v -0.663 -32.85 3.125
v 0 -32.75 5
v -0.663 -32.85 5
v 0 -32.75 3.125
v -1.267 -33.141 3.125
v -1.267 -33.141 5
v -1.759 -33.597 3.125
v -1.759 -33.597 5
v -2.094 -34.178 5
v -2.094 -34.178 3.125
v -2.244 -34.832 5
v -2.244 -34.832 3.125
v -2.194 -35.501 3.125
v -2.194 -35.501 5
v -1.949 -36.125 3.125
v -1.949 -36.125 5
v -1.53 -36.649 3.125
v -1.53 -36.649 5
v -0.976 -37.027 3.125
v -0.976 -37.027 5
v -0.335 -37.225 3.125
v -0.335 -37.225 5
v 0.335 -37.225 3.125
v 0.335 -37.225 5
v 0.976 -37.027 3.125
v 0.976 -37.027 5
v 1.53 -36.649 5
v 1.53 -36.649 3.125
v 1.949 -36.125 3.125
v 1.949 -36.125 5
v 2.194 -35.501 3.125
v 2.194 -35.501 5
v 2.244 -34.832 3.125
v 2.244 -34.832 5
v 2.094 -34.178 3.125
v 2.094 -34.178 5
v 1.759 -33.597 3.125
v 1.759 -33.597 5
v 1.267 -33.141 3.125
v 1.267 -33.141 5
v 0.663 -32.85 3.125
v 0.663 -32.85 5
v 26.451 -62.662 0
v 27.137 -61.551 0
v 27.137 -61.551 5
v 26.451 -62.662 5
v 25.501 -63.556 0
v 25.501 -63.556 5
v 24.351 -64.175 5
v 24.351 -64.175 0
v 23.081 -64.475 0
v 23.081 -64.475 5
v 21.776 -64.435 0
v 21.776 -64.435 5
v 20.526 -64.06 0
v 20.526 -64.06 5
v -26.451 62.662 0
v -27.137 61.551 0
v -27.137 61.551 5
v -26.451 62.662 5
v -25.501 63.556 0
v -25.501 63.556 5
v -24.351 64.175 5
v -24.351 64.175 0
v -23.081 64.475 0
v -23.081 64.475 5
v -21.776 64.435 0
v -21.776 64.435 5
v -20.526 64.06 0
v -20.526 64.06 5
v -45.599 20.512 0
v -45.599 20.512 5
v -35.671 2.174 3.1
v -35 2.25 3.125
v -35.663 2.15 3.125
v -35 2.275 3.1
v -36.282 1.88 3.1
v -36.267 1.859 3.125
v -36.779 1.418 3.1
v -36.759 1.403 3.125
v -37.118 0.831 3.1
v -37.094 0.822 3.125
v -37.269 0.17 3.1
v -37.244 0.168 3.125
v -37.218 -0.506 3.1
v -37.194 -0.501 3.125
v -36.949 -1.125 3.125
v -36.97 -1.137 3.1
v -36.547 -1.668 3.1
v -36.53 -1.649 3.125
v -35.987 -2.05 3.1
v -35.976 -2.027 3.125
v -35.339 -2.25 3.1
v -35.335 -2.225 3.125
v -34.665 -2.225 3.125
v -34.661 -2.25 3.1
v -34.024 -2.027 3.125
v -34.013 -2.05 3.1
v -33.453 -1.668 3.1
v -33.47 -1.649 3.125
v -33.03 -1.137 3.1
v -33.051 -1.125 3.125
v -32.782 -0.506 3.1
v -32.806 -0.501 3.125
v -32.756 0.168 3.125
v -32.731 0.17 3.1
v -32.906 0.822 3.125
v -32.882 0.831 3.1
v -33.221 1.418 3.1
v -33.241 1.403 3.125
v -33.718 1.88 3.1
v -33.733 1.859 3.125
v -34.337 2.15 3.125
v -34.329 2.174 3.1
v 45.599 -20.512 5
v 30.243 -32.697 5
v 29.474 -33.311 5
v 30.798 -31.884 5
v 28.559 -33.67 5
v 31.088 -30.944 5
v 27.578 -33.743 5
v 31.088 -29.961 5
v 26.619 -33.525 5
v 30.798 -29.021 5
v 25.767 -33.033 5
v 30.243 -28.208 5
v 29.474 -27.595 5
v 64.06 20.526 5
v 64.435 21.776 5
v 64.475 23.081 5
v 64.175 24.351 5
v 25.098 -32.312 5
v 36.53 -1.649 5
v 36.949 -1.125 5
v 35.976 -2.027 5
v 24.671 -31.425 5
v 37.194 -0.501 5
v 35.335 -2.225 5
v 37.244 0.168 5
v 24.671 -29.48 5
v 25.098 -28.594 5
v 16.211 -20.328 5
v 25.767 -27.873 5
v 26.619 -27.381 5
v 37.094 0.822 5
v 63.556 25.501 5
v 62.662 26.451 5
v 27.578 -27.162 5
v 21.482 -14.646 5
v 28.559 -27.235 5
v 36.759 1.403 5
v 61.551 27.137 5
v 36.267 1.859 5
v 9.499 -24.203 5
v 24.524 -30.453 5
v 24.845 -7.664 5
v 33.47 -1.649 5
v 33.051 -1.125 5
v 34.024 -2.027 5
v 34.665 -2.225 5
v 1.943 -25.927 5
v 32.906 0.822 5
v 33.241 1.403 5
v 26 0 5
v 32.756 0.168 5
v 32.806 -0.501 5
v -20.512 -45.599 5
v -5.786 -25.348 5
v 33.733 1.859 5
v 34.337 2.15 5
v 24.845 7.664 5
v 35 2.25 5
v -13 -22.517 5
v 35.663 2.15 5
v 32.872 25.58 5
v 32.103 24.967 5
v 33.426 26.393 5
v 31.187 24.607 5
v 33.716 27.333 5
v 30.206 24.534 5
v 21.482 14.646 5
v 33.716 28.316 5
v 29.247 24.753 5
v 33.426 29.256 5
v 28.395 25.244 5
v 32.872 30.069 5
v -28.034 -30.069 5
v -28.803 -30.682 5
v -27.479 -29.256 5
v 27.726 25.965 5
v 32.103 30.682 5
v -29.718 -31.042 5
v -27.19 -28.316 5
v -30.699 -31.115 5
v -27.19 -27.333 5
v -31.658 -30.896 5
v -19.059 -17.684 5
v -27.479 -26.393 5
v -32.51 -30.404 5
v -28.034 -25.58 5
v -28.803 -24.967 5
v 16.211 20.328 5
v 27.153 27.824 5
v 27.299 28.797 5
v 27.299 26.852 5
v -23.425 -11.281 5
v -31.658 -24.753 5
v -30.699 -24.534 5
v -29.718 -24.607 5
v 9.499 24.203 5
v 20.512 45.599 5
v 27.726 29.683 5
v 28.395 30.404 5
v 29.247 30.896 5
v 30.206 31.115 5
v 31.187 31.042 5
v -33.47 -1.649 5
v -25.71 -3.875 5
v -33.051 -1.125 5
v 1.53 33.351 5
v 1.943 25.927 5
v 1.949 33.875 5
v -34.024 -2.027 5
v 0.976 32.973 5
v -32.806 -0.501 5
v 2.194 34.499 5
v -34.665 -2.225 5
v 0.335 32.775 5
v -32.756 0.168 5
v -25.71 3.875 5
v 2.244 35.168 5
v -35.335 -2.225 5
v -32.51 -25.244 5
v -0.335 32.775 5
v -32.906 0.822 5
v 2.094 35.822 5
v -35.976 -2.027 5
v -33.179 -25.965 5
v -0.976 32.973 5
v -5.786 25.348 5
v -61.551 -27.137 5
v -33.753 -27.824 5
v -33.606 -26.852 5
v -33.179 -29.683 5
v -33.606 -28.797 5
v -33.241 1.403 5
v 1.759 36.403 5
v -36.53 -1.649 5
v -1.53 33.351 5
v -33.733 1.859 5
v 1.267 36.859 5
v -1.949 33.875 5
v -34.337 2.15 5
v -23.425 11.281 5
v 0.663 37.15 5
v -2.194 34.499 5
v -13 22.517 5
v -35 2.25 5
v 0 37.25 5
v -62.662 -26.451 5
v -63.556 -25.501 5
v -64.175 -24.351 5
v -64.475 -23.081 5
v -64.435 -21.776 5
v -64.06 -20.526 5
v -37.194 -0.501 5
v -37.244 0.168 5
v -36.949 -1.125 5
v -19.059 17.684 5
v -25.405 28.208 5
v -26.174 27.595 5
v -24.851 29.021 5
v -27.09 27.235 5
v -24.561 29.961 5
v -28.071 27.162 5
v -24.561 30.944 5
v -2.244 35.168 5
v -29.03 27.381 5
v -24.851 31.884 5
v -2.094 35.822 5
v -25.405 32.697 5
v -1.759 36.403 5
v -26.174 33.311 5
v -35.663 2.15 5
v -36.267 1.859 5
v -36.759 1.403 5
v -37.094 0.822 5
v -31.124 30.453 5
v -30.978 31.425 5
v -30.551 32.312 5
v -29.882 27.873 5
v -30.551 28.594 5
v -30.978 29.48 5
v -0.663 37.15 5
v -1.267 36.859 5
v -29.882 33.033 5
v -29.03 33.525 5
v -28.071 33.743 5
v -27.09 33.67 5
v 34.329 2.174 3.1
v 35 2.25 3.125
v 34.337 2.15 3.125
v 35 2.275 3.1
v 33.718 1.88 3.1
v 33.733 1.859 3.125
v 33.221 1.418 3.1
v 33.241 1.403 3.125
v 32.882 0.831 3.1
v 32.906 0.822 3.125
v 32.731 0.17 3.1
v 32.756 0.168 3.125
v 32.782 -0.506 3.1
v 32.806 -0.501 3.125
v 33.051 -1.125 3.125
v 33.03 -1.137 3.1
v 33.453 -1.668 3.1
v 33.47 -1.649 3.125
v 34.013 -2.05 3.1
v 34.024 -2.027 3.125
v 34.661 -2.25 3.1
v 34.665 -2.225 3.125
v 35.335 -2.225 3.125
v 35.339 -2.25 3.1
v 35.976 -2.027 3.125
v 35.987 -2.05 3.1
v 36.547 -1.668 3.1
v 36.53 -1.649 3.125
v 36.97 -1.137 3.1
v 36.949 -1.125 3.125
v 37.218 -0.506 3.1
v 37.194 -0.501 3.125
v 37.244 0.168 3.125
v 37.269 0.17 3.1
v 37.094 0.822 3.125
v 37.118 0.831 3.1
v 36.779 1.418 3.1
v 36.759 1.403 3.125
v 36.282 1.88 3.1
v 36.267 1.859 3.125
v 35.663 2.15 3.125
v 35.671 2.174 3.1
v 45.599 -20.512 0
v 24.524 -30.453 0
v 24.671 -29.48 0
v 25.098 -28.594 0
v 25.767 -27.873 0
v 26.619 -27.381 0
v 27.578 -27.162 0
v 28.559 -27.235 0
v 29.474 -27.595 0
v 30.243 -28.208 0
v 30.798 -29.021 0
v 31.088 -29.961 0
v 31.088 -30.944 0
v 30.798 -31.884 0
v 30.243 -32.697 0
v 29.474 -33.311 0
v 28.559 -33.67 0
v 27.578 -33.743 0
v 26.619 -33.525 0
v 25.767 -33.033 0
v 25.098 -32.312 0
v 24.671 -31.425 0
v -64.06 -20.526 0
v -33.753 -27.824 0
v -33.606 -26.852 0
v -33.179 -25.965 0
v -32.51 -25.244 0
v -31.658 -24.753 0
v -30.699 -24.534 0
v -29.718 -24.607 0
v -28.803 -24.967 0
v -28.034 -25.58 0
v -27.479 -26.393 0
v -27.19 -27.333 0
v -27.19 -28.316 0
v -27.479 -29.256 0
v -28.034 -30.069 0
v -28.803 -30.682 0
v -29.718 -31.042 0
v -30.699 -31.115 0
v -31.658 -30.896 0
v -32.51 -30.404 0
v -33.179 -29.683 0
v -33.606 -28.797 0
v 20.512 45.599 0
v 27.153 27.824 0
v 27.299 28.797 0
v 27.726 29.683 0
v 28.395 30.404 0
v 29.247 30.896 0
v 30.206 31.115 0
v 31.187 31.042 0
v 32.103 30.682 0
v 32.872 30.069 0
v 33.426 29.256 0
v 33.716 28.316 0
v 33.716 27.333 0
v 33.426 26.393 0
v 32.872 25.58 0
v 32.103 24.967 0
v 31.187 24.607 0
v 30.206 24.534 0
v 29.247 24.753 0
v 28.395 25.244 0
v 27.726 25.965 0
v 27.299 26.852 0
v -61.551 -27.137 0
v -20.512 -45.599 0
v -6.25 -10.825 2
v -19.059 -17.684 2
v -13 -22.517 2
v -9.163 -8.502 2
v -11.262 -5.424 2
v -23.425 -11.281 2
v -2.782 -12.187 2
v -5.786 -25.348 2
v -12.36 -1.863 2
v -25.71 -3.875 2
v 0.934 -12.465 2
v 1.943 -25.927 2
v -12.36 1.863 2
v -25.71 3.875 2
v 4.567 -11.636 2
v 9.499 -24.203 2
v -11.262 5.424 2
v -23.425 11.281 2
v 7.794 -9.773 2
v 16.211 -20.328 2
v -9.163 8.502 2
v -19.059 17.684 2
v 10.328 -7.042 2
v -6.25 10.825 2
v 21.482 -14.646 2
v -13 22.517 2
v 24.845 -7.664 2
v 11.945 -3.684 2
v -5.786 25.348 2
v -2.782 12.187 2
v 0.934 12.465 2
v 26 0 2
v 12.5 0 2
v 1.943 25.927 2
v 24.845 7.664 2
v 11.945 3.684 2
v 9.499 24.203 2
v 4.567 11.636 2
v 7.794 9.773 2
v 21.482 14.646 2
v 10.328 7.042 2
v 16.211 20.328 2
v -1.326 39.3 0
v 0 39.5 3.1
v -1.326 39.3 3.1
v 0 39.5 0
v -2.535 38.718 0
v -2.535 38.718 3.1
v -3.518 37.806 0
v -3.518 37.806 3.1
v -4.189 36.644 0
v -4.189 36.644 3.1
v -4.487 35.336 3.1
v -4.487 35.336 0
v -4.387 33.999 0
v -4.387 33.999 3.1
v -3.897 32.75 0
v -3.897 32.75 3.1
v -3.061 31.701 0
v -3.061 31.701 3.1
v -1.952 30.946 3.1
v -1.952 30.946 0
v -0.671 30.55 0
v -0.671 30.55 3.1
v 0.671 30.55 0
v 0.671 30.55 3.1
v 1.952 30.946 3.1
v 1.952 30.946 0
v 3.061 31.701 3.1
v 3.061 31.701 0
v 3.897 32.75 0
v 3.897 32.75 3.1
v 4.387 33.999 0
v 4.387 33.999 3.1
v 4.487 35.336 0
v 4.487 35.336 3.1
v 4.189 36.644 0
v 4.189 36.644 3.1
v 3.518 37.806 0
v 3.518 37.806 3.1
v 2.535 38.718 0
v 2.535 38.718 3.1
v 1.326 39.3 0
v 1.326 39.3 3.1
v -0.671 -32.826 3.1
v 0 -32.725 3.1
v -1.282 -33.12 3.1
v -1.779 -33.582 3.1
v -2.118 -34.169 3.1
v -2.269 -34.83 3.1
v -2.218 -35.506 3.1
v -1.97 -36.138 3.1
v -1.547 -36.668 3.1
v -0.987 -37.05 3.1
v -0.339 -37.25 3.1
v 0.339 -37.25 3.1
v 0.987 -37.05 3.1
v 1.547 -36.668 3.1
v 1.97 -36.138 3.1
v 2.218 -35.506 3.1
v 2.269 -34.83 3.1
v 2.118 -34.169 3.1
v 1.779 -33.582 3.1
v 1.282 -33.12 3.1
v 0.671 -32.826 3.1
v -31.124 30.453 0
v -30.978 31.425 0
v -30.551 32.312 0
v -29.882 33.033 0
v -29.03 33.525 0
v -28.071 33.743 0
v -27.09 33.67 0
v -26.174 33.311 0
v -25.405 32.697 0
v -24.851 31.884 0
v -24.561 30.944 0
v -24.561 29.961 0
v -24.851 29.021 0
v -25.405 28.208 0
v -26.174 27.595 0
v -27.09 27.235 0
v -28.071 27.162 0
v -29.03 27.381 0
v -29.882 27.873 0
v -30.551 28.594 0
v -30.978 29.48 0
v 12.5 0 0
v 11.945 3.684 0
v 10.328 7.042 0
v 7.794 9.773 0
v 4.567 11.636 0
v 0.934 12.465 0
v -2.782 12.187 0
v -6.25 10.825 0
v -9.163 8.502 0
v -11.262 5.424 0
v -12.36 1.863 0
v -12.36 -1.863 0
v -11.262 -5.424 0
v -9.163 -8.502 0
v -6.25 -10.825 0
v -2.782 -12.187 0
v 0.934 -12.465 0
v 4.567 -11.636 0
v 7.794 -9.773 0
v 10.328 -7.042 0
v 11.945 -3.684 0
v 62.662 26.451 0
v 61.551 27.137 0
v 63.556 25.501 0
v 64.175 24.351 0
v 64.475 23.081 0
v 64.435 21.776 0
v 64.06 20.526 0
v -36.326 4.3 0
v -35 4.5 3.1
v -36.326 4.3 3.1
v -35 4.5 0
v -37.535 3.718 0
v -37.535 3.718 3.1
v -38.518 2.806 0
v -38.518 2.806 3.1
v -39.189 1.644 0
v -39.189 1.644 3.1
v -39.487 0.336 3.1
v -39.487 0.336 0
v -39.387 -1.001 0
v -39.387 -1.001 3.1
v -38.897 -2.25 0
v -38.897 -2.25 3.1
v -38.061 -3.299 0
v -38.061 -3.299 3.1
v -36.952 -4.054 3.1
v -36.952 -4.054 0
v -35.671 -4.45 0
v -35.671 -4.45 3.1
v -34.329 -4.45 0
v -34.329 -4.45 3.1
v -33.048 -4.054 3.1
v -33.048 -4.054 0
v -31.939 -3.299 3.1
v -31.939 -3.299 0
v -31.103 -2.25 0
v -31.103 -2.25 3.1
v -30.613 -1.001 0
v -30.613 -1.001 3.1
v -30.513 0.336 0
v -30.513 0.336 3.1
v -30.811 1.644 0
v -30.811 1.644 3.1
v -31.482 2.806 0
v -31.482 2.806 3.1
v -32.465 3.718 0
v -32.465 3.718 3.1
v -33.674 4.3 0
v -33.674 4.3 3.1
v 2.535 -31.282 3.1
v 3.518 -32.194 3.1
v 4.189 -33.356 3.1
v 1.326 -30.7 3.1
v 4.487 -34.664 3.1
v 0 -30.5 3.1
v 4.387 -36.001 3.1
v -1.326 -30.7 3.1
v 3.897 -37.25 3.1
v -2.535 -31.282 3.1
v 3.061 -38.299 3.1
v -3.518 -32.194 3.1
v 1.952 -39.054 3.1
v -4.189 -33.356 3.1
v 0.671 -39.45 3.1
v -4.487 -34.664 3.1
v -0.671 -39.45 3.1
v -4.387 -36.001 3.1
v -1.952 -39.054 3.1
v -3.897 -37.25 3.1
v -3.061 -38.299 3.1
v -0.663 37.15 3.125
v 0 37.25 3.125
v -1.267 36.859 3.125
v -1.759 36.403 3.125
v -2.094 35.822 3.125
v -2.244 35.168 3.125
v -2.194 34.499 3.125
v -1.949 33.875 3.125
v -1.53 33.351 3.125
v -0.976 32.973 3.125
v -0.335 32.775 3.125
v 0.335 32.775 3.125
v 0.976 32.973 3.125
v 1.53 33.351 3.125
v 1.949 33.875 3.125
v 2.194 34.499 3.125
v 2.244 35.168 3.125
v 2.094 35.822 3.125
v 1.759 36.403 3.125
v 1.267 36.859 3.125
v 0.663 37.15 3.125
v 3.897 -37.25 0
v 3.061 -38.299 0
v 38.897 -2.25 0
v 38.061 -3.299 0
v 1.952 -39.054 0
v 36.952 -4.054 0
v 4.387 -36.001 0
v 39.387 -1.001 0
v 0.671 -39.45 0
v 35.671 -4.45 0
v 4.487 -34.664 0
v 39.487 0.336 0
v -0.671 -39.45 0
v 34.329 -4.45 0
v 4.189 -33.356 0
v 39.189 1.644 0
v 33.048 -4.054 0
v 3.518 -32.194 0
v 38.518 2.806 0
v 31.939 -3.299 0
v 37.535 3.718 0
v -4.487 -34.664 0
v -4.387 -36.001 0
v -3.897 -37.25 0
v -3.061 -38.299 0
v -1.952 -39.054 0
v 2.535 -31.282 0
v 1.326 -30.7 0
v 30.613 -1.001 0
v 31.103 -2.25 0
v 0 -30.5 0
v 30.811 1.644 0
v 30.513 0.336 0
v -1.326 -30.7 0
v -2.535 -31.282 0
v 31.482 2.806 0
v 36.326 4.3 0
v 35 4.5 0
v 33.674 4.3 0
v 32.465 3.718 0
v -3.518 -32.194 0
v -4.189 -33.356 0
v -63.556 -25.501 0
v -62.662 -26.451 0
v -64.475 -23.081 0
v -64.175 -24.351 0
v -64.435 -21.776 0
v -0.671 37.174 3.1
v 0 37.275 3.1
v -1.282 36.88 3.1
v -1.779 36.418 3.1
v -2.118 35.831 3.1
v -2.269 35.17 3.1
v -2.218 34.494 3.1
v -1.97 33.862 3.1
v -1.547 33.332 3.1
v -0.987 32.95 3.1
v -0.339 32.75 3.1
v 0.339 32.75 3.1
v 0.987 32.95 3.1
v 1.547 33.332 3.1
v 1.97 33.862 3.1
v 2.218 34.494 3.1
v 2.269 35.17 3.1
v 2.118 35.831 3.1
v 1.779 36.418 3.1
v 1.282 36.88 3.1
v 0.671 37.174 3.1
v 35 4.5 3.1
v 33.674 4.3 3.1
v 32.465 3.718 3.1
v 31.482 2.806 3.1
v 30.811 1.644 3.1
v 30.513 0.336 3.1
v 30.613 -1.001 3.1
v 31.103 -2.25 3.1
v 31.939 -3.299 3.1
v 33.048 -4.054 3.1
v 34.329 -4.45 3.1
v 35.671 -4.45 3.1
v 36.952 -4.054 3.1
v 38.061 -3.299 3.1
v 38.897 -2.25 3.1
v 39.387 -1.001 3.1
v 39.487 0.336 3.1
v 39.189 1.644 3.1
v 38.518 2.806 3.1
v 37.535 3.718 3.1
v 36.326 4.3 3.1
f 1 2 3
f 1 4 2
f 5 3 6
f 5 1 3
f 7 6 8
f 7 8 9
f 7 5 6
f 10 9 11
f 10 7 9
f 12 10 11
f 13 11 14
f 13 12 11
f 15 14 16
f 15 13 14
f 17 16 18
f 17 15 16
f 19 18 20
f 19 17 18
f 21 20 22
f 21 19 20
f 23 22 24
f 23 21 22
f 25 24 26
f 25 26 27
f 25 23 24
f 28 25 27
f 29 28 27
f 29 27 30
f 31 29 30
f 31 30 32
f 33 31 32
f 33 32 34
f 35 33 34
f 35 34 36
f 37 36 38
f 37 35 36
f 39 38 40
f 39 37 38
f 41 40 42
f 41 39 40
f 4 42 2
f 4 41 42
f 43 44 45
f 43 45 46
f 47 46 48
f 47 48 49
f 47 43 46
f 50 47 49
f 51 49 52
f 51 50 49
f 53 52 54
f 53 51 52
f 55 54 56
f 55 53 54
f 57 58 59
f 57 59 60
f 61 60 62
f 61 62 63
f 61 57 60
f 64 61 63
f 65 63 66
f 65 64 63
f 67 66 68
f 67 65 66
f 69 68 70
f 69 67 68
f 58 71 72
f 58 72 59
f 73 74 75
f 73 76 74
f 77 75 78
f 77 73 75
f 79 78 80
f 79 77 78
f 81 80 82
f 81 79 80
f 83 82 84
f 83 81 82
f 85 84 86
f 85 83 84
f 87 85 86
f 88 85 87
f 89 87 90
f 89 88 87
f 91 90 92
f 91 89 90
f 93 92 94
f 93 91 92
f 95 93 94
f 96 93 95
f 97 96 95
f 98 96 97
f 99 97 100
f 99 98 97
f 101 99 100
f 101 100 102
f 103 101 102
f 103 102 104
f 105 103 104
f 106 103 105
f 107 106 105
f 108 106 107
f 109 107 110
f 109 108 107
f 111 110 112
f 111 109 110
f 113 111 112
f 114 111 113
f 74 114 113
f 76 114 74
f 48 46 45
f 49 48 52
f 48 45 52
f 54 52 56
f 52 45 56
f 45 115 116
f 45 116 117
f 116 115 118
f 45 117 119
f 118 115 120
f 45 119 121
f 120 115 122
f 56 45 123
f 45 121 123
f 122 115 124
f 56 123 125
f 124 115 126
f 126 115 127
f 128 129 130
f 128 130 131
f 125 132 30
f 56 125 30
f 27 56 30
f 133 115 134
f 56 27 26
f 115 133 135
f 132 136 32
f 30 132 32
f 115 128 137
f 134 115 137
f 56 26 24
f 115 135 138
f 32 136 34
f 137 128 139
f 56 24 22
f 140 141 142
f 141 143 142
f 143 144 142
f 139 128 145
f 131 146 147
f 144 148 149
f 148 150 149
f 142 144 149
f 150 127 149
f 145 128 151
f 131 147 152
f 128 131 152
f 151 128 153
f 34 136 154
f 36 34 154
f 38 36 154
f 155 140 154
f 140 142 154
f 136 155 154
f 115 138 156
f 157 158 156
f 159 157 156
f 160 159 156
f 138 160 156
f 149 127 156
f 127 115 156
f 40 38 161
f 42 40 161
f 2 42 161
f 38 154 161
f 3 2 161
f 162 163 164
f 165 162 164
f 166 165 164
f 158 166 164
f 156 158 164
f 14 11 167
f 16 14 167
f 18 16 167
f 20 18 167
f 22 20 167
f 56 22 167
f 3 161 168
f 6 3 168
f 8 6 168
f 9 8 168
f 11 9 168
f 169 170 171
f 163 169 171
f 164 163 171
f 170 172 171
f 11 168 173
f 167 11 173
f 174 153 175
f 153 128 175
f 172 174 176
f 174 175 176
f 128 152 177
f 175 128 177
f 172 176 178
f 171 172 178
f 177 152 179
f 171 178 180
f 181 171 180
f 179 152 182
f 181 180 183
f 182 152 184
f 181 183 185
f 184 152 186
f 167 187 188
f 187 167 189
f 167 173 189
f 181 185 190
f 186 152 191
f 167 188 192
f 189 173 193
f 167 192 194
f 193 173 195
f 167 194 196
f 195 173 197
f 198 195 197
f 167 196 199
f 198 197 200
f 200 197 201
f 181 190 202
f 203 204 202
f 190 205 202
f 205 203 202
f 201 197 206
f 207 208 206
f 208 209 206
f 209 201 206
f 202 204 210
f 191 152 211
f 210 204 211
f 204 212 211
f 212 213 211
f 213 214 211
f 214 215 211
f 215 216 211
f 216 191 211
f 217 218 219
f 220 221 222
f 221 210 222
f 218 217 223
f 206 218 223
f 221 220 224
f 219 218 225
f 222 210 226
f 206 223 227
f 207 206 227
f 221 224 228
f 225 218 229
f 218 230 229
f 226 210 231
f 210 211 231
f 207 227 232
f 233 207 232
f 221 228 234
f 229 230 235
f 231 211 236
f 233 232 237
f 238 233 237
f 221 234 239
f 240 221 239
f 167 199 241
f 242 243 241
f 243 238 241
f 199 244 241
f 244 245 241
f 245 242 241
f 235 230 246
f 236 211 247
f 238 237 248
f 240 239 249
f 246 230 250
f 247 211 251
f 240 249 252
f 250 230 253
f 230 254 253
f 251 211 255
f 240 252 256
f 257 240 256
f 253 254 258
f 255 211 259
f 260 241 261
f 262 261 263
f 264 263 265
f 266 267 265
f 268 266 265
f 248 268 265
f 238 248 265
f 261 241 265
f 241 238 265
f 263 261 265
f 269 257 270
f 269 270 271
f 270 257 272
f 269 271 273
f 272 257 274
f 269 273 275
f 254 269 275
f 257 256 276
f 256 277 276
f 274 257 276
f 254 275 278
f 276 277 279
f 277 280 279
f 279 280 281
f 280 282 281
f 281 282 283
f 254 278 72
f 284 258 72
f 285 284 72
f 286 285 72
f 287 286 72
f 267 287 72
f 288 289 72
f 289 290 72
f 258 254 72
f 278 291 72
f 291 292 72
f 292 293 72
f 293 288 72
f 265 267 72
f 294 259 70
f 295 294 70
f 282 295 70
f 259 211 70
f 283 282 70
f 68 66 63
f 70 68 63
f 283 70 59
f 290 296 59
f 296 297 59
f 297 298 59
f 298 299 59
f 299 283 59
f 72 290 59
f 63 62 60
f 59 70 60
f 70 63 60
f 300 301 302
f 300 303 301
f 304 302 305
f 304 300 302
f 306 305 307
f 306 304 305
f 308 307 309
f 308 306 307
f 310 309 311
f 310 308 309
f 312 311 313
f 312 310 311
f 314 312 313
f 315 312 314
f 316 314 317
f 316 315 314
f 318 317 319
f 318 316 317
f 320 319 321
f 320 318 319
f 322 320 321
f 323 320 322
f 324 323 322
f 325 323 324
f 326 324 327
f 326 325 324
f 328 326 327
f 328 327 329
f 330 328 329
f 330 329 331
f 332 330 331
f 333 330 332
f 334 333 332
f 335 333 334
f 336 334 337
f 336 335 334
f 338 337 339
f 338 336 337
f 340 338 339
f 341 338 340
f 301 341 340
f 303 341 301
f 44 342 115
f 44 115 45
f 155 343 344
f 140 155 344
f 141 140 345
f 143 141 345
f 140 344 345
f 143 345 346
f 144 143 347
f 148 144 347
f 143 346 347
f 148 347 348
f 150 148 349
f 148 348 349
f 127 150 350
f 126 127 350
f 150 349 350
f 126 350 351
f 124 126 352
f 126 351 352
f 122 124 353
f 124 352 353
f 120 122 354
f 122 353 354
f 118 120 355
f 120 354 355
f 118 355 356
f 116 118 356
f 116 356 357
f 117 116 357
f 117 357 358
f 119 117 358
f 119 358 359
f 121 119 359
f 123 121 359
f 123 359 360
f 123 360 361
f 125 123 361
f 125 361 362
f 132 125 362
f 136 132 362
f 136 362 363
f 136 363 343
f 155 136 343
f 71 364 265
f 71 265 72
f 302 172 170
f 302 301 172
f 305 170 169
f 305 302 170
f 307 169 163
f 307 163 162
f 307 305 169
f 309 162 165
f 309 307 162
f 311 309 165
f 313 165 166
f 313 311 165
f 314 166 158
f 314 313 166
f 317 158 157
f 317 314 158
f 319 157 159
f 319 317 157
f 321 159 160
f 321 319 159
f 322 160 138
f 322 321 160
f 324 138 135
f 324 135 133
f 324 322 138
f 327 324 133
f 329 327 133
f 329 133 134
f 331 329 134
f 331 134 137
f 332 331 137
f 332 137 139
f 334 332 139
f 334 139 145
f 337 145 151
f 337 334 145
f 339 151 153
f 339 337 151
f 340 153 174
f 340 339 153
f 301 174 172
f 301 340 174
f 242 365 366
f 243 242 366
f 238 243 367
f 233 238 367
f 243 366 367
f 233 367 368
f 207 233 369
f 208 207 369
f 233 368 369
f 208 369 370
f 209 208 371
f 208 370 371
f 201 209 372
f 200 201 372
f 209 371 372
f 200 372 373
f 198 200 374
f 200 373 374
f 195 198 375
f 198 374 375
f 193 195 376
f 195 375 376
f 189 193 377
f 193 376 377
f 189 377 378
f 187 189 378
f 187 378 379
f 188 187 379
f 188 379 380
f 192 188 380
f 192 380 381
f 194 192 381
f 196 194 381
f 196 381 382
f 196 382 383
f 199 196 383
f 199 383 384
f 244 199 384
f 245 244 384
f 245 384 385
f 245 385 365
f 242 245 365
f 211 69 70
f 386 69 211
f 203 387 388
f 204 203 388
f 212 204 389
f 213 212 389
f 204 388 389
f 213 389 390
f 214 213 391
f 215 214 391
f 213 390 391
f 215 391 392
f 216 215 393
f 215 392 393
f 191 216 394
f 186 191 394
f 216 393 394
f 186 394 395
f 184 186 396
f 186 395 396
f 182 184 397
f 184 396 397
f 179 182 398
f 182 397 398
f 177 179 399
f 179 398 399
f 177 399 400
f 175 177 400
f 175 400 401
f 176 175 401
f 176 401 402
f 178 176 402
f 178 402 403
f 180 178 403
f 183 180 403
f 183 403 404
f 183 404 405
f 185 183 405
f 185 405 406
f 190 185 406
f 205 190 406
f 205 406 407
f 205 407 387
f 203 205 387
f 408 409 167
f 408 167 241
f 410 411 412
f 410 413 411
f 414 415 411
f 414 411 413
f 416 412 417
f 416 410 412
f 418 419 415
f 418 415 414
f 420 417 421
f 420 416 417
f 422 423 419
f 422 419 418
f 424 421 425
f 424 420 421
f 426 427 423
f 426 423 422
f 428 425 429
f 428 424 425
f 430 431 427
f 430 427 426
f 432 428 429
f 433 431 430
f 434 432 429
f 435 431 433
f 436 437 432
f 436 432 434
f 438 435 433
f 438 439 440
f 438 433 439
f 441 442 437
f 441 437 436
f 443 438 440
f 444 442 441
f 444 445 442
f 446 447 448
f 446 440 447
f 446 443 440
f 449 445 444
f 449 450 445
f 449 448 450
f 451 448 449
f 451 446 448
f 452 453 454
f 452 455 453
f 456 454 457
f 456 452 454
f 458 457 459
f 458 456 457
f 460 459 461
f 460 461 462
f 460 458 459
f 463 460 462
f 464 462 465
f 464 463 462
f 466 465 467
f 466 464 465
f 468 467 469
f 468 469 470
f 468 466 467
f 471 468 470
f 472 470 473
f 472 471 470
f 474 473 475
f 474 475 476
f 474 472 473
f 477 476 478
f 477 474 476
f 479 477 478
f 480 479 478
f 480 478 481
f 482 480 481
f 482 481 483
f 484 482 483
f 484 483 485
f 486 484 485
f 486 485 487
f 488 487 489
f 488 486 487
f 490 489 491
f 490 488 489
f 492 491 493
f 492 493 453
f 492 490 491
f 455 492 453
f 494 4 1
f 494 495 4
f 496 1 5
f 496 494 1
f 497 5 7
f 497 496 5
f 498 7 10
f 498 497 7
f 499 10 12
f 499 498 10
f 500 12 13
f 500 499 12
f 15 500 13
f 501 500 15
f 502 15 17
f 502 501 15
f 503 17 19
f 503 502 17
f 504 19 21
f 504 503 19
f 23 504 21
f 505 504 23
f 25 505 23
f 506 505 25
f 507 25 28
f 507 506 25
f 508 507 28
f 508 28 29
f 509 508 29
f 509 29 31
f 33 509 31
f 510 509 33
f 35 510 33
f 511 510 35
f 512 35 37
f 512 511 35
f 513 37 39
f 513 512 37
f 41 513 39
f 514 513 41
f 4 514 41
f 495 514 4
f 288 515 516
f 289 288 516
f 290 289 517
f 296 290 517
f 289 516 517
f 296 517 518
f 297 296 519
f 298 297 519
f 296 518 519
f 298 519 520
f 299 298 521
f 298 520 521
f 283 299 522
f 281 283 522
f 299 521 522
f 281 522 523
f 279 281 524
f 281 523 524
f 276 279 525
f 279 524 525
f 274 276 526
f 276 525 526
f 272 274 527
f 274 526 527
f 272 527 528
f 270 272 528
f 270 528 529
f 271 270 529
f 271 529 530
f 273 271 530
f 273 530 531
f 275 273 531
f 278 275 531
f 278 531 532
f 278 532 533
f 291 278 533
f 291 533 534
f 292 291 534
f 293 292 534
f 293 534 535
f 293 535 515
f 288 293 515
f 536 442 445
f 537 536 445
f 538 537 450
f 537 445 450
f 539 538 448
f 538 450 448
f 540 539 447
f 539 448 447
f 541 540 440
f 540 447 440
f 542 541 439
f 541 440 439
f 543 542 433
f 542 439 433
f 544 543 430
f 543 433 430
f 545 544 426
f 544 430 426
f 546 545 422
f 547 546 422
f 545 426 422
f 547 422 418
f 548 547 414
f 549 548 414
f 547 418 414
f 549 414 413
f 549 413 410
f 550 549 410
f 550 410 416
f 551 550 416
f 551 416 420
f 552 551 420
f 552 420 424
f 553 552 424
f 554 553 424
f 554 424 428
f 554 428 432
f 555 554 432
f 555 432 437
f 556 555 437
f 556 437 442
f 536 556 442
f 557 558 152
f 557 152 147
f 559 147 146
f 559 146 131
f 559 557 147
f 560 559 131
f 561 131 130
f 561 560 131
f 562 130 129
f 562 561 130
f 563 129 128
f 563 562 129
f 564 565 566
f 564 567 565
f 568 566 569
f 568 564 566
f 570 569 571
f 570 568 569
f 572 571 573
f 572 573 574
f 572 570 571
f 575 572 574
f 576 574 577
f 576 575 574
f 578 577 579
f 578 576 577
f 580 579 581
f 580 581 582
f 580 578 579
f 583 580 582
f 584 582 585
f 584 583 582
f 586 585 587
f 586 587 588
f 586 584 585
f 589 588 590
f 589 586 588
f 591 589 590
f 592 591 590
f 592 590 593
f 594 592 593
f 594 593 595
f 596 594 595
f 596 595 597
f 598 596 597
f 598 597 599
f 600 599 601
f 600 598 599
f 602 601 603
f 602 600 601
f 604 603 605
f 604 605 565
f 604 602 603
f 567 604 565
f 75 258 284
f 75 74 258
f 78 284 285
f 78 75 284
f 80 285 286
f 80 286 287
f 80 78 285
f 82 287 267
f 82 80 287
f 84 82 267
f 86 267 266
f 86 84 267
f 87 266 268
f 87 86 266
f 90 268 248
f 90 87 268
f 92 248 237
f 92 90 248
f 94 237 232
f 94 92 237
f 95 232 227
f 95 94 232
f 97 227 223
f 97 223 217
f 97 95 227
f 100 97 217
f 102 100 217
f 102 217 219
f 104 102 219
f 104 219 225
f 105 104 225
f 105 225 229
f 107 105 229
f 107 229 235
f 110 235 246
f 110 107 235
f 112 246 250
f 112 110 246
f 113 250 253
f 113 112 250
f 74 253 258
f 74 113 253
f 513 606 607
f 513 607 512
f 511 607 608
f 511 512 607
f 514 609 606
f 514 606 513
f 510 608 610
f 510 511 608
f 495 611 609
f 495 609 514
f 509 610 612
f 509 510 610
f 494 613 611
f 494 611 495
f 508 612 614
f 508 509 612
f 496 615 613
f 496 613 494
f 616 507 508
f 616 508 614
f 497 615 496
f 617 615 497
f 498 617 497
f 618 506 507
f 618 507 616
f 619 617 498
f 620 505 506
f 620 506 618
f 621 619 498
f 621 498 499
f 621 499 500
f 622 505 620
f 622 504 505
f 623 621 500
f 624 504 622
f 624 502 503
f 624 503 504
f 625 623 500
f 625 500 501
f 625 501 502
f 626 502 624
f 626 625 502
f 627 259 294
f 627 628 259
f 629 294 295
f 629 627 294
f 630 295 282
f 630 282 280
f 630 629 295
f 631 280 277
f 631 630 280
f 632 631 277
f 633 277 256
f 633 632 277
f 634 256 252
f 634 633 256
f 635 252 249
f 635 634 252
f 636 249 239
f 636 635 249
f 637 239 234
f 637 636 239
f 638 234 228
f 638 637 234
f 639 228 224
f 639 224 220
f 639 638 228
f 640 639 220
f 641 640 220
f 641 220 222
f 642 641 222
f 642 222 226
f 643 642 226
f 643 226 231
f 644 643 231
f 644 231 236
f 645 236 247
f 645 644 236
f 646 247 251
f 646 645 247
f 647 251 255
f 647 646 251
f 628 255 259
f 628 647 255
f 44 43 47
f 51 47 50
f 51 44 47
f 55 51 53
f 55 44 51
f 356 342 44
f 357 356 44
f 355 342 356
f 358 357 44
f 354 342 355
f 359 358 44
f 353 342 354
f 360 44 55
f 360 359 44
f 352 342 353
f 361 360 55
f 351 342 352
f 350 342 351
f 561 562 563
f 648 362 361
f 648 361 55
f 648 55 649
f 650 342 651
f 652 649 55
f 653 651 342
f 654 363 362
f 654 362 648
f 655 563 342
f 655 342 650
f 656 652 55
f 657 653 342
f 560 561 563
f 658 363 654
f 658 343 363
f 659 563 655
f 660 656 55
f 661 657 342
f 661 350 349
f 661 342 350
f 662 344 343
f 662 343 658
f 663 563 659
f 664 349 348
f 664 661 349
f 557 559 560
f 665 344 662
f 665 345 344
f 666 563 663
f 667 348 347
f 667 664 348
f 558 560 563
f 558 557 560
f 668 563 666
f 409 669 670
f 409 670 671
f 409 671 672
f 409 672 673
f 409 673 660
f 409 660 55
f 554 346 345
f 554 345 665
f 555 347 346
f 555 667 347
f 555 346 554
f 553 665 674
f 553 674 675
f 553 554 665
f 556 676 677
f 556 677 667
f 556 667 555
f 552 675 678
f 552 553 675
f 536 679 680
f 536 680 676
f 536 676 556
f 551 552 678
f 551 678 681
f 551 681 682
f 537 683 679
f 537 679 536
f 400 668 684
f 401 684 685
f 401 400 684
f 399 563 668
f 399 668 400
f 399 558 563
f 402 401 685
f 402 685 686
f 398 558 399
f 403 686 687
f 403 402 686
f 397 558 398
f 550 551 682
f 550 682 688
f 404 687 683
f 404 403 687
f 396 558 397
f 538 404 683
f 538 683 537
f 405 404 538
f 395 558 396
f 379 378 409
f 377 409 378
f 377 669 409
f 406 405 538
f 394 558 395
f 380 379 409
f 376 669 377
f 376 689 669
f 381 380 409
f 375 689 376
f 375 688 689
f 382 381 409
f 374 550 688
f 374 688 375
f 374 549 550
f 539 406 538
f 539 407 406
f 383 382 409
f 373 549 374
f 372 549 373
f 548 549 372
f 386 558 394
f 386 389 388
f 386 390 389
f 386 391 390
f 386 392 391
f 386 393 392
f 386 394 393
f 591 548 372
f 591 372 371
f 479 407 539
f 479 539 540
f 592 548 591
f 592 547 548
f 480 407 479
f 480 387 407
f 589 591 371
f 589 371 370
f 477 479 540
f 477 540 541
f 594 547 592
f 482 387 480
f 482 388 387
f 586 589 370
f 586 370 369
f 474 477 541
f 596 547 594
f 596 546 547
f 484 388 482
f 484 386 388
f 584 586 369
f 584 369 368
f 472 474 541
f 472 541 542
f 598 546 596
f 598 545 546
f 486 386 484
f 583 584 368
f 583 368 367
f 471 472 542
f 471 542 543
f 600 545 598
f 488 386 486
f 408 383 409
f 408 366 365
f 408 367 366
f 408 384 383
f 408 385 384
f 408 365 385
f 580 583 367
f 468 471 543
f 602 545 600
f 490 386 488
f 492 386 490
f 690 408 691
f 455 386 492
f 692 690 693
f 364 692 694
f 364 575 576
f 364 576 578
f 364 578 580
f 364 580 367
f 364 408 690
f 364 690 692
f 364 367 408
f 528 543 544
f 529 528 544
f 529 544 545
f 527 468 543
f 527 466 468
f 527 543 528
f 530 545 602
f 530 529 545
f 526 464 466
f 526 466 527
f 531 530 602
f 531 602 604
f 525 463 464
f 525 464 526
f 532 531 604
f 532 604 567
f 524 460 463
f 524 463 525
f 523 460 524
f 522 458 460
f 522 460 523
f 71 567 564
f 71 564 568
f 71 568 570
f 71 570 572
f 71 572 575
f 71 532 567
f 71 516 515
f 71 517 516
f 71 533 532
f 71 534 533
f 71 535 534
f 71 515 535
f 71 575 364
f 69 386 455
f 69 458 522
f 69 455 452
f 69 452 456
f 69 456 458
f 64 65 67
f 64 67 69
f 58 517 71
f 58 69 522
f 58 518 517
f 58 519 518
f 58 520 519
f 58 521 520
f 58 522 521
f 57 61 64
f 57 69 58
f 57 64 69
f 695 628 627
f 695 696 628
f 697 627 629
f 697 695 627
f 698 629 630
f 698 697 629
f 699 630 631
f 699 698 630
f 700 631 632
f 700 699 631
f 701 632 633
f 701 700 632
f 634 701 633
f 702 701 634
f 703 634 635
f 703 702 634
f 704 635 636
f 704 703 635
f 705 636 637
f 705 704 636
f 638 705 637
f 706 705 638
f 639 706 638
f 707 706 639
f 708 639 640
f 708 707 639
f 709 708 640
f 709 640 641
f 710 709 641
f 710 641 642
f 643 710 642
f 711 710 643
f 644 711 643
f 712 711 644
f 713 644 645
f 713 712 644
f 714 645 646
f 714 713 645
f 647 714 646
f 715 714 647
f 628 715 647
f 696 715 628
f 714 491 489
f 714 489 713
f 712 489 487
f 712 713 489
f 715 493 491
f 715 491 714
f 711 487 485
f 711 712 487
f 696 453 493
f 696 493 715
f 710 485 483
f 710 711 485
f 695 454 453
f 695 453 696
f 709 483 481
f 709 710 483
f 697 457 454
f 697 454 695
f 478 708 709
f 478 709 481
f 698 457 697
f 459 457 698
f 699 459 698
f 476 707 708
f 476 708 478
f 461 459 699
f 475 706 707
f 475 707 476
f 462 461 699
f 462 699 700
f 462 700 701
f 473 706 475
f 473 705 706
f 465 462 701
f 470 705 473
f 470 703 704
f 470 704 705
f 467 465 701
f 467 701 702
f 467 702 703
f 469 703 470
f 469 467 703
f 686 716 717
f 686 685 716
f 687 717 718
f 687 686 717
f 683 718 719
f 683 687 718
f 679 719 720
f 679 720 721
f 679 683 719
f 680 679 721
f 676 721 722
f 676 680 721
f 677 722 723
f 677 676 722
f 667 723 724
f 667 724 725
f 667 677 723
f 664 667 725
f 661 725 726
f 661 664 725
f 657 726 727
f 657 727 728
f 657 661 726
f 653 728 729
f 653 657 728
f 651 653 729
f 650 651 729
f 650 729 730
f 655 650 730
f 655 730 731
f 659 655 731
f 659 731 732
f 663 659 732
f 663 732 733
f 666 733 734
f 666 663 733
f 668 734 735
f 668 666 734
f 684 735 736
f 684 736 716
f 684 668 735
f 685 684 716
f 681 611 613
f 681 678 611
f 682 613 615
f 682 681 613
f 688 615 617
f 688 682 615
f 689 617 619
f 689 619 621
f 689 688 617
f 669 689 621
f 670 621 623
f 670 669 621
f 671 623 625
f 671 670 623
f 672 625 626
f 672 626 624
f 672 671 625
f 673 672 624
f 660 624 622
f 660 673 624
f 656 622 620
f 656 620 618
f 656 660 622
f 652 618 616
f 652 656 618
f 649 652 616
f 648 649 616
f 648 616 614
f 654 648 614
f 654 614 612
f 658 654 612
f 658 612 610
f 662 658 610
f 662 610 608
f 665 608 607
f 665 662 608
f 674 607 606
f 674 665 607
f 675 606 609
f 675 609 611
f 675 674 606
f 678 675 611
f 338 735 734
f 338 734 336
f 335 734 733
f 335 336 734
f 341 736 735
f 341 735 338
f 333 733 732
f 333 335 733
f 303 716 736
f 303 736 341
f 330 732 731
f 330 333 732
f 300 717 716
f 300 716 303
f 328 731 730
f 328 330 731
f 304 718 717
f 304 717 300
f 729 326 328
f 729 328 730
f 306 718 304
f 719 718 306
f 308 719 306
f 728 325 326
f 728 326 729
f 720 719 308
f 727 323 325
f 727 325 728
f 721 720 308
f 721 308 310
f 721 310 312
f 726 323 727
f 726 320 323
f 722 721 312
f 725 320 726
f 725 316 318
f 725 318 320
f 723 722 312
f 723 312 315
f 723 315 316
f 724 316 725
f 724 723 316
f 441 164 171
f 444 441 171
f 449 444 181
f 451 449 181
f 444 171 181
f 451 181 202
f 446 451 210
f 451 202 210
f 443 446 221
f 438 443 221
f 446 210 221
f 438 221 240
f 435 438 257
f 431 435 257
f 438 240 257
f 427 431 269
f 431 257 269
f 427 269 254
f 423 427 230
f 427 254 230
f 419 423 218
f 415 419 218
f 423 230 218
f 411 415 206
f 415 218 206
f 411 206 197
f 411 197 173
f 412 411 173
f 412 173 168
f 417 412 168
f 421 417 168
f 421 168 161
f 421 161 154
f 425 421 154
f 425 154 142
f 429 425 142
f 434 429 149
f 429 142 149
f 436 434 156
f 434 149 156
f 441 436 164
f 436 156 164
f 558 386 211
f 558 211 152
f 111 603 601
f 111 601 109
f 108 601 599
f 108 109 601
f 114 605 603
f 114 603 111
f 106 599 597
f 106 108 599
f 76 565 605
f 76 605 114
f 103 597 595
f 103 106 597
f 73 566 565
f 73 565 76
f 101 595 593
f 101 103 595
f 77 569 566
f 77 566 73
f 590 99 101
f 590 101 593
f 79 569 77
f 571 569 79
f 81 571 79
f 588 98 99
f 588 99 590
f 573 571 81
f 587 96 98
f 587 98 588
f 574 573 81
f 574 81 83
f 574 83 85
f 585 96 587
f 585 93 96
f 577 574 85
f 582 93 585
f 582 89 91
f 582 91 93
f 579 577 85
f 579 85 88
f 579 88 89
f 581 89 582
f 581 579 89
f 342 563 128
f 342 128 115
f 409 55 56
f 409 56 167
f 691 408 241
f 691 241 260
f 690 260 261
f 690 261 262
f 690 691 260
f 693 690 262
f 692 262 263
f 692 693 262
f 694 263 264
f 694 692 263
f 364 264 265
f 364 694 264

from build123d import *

# Parameters (mm, degrees)
ESQUISSE1_R                                = 50
BOSS_EXTRU_1_DEPTH                         = 5
ESQUISSE2_R                                = 26
ENL_V_MAT_EXTRU_1_DEPTH                    = 3
ESQUISSE3_R                                = 12.5
ENL_V_MAT_EXTRU_2_DEPTH                    = 71.887234394
CHAMBRAGE_POUR_VIS_T_TE_RONDE_BOMB_2_COUNT = 2
CHAMBRAGE_POUR_VIS_T_TE_RONDE_BOMB_2_PITCH = 49.497474683
CHAMBRAGE_POUR_VIS_T_TE_RONDE_BOMB_3_COUNT = 2
CHAMBRAGE_POUR_VIS_T_TE_RONDE_BOMB_3_PITCH = 70
CHAMBRAGE_POUR_VIS_T_TE_RONDE_BOMB_4_COUNT = 2
CHAMBRAGE_POUR_VIS_T_TE_RONDE_BOMB_4_PITCH = 49.497474683
D_GAGEMENT_M62_D                           = 6.6
BOSS_EXTRU_3_DEPTH                         = 5


with BuildPart() as part:
    # Esquisse1 → Boss.-Extru.1 (new body)
    with BuildSketch(Plane.XY):
        Circle(ESQUISSE1_R)
    extrude(amount=BOSS_EXTRU_1_DEPTH)

    # Esquisse2 → Enlèv. mat.-Extru.1 (cut)
    with BuildSketch(Plane.XY.offset(5)):
        Circle(ESQUISSE2_R)
    extrude(amount=-ENL_V_MAT_EXTRU_1_DEPTH, mode=Mode.SUBTRACT)

    # Esquisse3 → Enlèv. mat.-Extru.2 (cut, through all)
    with BuildSketch(Plane.XY.offset(5)):
        Circle(ESQUISSE3_R)
    extrude(amount=-ENL_V_MAT_EXTRU_2_DEPTH, mode=Mode.SUBTRACT)

    # Esquisse5 → Chambrage pour vis à tête ronde bombée M41 (revolve, cut)
    with BuildSketch(Plane(origin=(0, 35, 0), x_dir=(0, 1, 0), z_dir=(1, 0, 0))):
        Polygon((0, 0), (0, 5), (2.25, 5), (2.25, 3.125), (2.275, 3.1), (4.5, 3.1), (4.5, 0), align=None)
    chambrage_pour_vis_t_te_ronde_bomb_e_m = revolve(axis=Axis((0, 35, -6.35), (0, 0, 1)), mode=Mode.SUBTRACT)

    # Chambrage pour vis _ t_te ronde bomb 2: Chambrage pour vis à tête ronde bombée M41 ×2
    with Locations(*[Vector(-0.7071067811865476, -0.7071067811865476, 0) * (i * CHAMBRAGE_POUR_VIS_T_TE_RONDE_BOMB_2_PITCH) for i in range(1, CHAMBRAGE_POUR_VIS_T_TE_RONDE_BOMB_2_COUNT)]):
        add(chambrage_pour_vis_t_te_ronde_bomb_e_m, mode=Mode.SUBTRACT)

    # Chambrage pour vis _ t_te ronde bomb 3: Chambrage pour vis à tête ronde bombée M41 ×2
    with Locations(*[(0, -i * CHAMBRAGE_POUR_VIS_T_TE_RONDE_BOMB_3_PITCH, 0) for i in range(1, CHAMBRAGE_POUR_VIS_T_TE_RONDE_BOMB_3_COUNT)]):
        add(chambrage_pour_vis_t_te_ronde_bomb_e_m, mode=Mode.SUBTRACT)

    # Chambrage pour vis _ t_te ronde bomb 4: Chambrage pour vis à tête ronde bombée M41 ×2
    with Locations(*[Vector(0.7071067811865476, -0.7071067811865476, 0) * (i * CHAMBRAGE_POUR_VIS_T_TE_RONDE_BOMB_4_PITCH) for i in range(1, CHAMBRAGE_POUR_VIS_T_TE_RONDE_BOMB_4_COUNT)]):
        add(chambrage_pour_vis_t_te_ronde_bomb_e_m, mode=Mode.SUBTRACT)

    # Dégagement M62 (through all)
    with Locations(Plane.XY.offset(5)):
        with Locations((30.452660491, 27.824413184), (-27.824413184, 30.452660491), (-30.452660491, -27.824413184), (27.824413184, -30.452660491)):
            Hole(D_GAGEMENT_M62_D / 2)

    # Esquisse12 → Boss.-Extru.3 (add)
    with BuildSketch(Plane(origin=(0, 0, 0), x_dir=(-1, 0, 0), z_dir=(0, 0, -1))):
        with BuildLine():
            ThreePointArc((-61.551276684, 27.137434265), (-64.174792612, 24.35142904), (-64.059895327, 20.526319949))
            Line((-64.059895327, 20.526319949), (-45.598664842, -20.512478267))
            ThreePointArc((-45.598664842, -20.512478267), (-46.747637649, 17.738612524), (-20.512478495, 45.598664739))
            Line((-20.512478495, 45.598664739), (-61.551276684, 27.137434265))
        make_face()
        with BuildLine():
            ThreePointArc((20.51247781, -45.598665047), (-17.738612875, -46.747637515), (-45.598664842, -20.512478267))
            Line((-45.598664842, -20.512478267), (-27.137434265, -61.551276684))
            ThreePointArc((-27.137434265, -61.551276684), (-24.35142904, -64.174792612), (-20.526319949, -64.059895327))
            Line((-20.526319949, -64.059895327), (20.51247781, -45.598665047))
        make_face()
        with BuildLine():
            Line((20.526319949, 64.059895327), (-20.512478495, 45.598664739))
            ThreePointArc((-20.512478495, 45.598664739), (17.738612852, 46.747637524), (45.598665129, 20.512477628))
            Line((45.598665129, 20.512477628), (27.137434265, 61.551276684))
            ThreePointArc((27.137434265, 61.551276684), (24.35142904, 64.174792612), (20.526319949, 64.059895327))
        make_face()
        with BuildLine():
            ThreePointArc((45.598665129, 20.512477628), (46.747637391, -17.738613203), (20.51247781, -45.598665047))
            Line((20.51247781, -45.598665047), (61.551276684, -27.137434265))
            ThreePointArc((61.551276684, -27.137434265), (64.174792612, -24.35142904), (64.059895327, -20.526319949))
            Line((64.059895327, -20.526319949), (45.598665129, 20.512477628))
        make_face()
    extrude(amount=-BOSS_EXTRU_3_DEPTH)


solid = part.part
